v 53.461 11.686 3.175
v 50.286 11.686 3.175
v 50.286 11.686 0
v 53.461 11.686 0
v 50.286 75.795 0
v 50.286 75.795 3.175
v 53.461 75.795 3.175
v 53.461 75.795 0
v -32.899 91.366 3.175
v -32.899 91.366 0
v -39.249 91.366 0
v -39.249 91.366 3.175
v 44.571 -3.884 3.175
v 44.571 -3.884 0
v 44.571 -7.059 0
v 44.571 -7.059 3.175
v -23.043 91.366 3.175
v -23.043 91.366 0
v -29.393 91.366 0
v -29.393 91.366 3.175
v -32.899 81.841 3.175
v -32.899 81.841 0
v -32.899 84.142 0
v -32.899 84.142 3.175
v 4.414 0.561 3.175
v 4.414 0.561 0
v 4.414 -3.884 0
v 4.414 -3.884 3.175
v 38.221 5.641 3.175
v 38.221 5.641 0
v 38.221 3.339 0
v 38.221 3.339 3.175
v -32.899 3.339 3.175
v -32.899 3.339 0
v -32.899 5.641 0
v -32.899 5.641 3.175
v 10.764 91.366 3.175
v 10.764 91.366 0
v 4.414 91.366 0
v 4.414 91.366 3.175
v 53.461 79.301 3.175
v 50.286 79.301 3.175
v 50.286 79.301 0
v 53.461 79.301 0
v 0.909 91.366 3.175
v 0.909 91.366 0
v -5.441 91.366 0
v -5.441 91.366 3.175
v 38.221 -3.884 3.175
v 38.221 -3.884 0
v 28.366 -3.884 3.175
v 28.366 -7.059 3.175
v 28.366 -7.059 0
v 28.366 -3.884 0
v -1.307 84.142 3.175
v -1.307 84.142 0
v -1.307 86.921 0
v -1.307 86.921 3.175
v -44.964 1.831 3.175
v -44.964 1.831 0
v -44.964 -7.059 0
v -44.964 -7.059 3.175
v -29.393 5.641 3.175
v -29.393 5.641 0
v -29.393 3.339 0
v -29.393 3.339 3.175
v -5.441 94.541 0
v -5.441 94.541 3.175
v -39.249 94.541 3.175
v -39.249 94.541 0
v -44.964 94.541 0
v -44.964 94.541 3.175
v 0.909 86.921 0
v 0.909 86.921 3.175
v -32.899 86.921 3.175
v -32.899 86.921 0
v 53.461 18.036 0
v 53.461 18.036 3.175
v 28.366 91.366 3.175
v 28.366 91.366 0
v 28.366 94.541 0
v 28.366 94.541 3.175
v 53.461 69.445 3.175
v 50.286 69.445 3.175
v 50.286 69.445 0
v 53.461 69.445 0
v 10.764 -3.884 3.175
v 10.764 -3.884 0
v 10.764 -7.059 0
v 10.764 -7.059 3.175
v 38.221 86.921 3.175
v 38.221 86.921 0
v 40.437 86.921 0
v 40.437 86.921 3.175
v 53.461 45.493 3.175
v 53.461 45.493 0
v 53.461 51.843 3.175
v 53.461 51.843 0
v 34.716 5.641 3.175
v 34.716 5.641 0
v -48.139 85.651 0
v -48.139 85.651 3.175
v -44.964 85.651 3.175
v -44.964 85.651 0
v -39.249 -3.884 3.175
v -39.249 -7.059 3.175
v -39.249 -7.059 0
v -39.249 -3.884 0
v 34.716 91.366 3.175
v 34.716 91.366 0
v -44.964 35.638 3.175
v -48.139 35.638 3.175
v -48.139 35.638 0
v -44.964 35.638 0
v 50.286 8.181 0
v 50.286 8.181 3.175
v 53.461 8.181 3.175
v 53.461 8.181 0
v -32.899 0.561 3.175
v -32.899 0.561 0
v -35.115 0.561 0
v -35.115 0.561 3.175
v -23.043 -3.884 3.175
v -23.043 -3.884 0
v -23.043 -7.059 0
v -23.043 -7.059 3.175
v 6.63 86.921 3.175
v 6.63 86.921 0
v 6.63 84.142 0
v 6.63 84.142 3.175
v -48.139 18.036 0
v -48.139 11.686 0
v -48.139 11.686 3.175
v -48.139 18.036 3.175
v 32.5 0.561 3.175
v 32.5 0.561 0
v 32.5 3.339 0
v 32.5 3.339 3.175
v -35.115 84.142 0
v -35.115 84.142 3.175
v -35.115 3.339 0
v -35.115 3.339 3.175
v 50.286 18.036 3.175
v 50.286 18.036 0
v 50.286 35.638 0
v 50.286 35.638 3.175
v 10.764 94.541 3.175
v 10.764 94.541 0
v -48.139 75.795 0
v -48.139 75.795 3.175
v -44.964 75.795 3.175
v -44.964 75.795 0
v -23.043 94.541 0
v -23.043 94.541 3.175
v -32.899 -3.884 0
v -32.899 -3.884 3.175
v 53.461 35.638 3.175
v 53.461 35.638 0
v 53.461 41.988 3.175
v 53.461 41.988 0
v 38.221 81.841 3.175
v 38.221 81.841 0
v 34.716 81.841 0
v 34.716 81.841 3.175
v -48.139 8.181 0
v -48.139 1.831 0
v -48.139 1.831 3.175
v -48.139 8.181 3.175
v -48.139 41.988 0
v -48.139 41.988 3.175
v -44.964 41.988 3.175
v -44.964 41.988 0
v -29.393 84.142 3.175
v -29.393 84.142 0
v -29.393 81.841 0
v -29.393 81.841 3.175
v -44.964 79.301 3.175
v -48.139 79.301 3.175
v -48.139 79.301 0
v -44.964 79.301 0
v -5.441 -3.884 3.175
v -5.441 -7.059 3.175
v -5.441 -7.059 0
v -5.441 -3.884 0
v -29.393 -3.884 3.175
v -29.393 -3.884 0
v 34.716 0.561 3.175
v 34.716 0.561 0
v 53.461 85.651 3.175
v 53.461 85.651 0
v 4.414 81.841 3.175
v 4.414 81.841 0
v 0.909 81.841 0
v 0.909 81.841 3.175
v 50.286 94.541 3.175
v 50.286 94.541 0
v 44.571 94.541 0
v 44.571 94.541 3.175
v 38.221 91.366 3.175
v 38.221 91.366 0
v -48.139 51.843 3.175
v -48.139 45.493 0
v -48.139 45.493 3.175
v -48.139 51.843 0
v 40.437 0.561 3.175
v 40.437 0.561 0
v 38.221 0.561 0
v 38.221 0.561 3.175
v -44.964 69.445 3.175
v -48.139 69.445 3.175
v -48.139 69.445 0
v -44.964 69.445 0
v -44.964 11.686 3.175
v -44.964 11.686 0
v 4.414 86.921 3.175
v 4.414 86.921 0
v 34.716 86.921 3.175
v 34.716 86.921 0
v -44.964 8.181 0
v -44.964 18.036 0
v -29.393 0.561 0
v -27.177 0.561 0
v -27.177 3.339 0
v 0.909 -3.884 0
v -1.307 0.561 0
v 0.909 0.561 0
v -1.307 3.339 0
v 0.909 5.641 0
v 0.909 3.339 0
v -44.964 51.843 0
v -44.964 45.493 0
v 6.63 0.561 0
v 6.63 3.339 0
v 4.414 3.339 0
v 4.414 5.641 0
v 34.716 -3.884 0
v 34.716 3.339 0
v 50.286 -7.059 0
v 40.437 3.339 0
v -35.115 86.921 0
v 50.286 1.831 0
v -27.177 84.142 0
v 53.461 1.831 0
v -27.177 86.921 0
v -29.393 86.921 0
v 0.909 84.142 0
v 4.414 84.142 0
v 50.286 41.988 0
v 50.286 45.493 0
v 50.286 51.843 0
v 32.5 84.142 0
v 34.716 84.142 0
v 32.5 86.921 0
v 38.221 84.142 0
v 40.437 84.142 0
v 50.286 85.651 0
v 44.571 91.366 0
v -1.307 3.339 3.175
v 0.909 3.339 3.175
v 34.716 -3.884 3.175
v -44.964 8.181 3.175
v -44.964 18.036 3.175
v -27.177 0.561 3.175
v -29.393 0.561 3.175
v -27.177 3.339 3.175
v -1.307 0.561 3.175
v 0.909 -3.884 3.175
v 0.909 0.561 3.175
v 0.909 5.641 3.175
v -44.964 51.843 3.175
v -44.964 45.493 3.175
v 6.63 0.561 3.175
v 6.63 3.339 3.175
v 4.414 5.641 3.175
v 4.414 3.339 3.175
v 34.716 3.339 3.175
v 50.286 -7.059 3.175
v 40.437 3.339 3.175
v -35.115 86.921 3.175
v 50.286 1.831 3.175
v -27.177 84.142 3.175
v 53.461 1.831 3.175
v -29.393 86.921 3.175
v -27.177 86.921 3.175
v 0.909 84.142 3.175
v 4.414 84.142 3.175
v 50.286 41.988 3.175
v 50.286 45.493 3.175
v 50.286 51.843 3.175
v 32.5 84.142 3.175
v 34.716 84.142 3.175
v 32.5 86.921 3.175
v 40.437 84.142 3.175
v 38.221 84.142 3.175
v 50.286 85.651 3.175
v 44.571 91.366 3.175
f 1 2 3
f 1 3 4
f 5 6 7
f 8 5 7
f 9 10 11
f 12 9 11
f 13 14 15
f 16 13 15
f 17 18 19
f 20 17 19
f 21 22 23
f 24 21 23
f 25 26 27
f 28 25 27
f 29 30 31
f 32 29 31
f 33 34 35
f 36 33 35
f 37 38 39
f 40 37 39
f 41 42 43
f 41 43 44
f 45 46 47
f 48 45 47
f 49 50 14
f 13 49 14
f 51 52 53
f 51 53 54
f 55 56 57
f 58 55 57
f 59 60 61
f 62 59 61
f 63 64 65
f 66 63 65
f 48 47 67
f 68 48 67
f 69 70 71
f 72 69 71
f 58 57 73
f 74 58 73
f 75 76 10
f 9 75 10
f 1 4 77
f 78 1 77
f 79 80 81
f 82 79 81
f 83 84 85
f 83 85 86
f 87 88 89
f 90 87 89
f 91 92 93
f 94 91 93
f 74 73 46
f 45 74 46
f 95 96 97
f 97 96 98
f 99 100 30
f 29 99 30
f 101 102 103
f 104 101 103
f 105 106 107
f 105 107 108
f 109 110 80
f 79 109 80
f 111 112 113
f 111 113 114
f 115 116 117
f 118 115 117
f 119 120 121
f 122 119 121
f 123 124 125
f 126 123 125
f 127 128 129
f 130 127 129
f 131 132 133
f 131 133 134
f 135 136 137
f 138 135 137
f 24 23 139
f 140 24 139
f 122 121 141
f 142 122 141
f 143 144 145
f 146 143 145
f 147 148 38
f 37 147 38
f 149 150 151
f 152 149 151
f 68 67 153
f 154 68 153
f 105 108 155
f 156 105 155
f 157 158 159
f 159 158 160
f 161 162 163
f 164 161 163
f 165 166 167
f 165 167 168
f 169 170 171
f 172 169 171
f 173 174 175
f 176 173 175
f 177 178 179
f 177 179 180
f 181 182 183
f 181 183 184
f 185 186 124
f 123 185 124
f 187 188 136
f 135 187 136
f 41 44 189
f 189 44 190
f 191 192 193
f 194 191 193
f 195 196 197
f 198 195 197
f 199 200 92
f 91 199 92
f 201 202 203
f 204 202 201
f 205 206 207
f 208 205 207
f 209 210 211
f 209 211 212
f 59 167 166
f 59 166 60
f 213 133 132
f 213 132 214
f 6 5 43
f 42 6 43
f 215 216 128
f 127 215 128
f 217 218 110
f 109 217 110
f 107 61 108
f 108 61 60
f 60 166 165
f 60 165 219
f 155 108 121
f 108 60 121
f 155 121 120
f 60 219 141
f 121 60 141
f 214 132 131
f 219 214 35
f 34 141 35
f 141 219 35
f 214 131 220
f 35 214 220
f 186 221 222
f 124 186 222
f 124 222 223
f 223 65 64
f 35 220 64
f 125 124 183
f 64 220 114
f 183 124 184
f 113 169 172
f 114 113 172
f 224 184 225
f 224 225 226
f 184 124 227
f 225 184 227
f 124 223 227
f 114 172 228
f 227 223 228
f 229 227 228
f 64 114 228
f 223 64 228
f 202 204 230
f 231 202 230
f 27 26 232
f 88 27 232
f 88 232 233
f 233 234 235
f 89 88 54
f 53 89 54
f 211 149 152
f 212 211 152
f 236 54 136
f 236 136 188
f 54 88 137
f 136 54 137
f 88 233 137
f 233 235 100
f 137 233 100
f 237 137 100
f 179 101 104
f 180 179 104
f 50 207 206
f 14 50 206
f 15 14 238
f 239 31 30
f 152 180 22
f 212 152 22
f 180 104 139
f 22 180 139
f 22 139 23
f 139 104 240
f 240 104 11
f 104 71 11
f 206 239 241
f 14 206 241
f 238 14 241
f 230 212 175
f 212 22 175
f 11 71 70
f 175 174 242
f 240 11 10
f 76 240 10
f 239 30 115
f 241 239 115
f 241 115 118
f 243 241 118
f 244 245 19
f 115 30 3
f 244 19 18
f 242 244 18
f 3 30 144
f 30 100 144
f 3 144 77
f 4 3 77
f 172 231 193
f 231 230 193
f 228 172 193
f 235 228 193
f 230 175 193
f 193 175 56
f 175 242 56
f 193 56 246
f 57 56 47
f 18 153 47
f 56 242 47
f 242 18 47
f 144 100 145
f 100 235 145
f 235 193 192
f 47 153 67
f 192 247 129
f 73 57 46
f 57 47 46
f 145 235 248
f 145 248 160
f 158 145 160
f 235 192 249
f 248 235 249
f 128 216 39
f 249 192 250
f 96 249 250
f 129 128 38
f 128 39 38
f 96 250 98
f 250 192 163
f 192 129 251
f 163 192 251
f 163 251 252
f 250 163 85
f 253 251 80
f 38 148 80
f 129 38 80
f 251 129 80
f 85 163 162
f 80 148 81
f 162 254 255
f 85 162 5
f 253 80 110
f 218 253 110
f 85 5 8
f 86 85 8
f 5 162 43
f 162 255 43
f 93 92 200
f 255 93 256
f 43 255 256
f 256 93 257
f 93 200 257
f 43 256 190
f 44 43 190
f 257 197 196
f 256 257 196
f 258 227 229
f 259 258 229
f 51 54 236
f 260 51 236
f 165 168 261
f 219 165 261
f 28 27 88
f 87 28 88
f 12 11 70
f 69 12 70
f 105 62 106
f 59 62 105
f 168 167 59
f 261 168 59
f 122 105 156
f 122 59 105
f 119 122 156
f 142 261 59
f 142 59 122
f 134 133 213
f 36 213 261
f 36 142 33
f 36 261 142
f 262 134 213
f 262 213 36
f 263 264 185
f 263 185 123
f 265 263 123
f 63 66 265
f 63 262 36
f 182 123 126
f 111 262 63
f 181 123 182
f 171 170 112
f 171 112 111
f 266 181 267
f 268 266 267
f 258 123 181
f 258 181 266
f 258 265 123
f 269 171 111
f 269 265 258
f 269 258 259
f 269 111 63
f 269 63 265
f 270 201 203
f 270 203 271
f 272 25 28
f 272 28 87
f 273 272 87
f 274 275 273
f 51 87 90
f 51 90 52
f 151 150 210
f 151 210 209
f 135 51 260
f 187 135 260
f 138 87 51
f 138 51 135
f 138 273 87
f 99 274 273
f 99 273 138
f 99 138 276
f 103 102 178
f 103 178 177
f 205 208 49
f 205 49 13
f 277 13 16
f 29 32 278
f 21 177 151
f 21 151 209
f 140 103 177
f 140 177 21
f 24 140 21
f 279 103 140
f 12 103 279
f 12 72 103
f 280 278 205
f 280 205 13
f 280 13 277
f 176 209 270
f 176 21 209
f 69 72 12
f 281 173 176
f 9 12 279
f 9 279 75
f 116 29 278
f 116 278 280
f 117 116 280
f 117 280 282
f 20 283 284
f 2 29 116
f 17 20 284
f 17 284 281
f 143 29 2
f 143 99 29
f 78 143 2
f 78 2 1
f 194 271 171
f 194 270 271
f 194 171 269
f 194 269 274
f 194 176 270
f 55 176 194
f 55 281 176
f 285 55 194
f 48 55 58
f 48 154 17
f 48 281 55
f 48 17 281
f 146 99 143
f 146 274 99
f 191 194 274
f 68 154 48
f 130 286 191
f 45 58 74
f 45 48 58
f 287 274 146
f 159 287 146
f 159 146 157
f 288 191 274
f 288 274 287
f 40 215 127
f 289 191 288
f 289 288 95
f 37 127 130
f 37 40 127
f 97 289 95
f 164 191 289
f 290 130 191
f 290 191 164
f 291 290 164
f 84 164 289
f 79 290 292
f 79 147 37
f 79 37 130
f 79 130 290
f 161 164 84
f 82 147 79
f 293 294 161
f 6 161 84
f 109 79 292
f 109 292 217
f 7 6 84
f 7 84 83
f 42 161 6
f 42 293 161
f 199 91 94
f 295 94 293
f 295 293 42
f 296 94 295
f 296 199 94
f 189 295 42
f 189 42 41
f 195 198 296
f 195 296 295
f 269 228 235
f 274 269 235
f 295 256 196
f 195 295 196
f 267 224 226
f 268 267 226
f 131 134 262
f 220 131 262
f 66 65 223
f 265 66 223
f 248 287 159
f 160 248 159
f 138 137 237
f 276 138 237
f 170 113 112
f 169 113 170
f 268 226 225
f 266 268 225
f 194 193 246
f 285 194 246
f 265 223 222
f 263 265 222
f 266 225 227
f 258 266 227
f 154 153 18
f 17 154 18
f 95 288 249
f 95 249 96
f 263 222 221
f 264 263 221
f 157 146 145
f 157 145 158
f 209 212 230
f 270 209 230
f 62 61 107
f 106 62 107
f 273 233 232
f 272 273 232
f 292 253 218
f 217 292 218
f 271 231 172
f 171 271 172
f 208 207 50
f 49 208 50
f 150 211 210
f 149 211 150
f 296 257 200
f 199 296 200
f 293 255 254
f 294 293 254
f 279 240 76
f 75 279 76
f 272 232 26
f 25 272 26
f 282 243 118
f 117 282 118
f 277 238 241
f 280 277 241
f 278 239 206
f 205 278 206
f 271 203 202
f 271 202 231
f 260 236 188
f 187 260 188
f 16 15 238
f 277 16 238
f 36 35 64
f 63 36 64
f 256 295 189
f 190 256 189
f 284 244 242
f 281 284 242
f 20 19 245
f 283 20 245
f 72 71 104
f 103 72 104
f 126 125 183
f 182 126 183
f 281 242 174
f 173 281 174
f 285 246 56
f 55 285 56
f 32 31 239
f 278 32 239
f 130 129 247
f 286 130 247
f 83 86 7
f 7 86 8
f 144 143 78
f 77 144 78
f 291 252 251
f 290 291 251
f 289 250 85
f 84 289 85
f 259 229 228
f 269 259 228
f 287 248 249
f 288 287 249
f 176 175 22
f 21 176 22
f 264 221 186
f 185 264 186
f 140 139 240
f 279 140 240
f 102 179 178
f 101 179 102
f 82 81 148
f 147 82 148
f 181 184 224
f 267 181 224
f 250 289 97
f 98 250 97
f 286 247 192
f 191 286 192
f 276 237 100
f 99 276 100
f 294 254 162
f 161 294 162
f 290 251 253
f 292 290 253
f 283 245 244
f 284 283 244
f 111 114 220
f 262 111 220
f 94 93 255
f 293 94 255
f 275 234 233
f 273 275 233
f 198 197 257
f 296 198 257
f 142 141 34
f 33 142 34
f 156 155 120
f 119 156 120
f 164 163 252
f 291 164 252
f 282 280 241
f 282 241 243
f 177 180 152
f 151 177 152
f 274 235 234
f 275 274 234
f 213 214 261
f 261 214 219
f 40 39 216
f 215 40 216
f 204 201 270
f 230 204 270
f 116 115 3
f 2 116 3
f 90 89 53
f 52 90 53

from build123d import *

# Parameters (mm, degrees)
F0_W     = 3.175
F0_H     = 6.35
F1_DEPTH = 3.175


with BuildPart() as f1:
    # F0 (on Top) → F1 (new body)
    with BuildSketch(Plane.XY):
        Polygon((-39.248684, 94.540516), (-44.963684, 94.540516), (-44.963684, 85.650516), (-44.963684, 79.300516), (-44.963684, 75.795316), (-44.963684, 69.445316), (-44.963684, 51.843116), (-44.963684, 45.493116), (-44.963684, 43.740516), (50.286316, 43.740516), (50.286316, 45.493116), (50.286316, 51.843116), (50.286316, 69.445316), (50.286316, 75.795316), (50.286316, 79.300516), (50.286316, 85.650516), (50.286316, 94.540516), (44.571316, 94.540516), (44.571316, 91.365516), (38.221316, 91.365516), (38.221316, 86.920516), (40.437466, 86.920516), (40.437466, 84.142391), (38.221316, 84.142391), (38.221316, 81.840516), (34.716116, 81.840516), (34.716116, 84.142391), (32.499966, 84.142391), (32.499966, 86.920516), (34.716116, 86.920516), (34.716116, 91.365516), (28.366116, 91.365516), (28.366116, 94.540516), (10.763916, 94.540516), (10.763916, 91.365516), (4.413916, 91.365516), (4.413916, 86.920516), (6.630066, 86.920516), (6.630066, 84.142391), (4.413916, 84.142391), (4.413916, 81.840516), (0.908716, 81.840516), (0.908716, 84.142391), (-1.307434, 84.142391), (-1.307434, 86.920516), (0.908716, 86.920516), (0.908716, 91.365516), (-5.441284, 91.365516), (-5.441284, 94.540516), (-23.043484, 94.540516), (-23.043484, 91.365516), (-29.393484, 91.365516), (-29.393484, 86.920516), (-27.177334, 86.920516), (-27.177334, 84.142391), (-29.393484, 84.142391), (-29.393484, 81.840516), (-32.898684, 81.840516), (-32.898684, 84.142391), (-35.114834, 84.142391), (-35.114834, 86.920516), (-32.898684, 86.920516), (-32.898684, 91.365516), (-39.248684, 91.365516), align=None)
        Polygon((50.286316, 43.740516), (-44.963684, 43.740516), (-44.963684, 41.987916), (-44.963684, 35.637916), (-44.963684, 18.035716), (-44.963684, 11.685716), (-44.963684, 8.180516), (-44.963684, 1.830516), (-44.963684, -7.059484), (-39.248684, -7.059484), (-39.248684, -3.884484), (-32.898684, -3.884484), (-32.898684, 0.560516), (-35.114834, 0.560516), (-35.114834, 3.338641), (-32.898684, 3.338641), (-32.898684, 5.640516), (-29.393484, 5.640516), (-29.393484, 3.338641), (-27.177334, 3.338641), (-27.177334, 0.560516), (-29.393484, 0.560516), (-29.393484, -3.884484), (-23.043484, -3.884484), (-23.043484, -7.059484), (-5.441284, -7.059484), (-5.441284, -3.884484), (0.908716, -3.884484), (0.908716, 0.560516), (-1.307434, 0.560516), (-1.307434, 3.338641), (0.908716, 3.338641), (0.908716, 5.640516), (4.413916, 5.640516), (4.413916, 3.338641), (6.630066, 3.338641), (6.630066, 0.560516), (4.413916, 0.560516), (4.413916, -3.884484), (10.763916, -3.884484), (10.763916, -7.059484), (28.366116, -7.059484), (28.366116, -3.884484), (34.716116, -3.884484), (34.716116, 0.560516), (32.499966, 0.560516), (32.499966, 3.338641), (34.716116, 3.338641), (34.716116, 5.640516), (38.221316, 5.640516), (38.221316, 3.338641), (40.437466, 3.338641), (40.437466, 0.560516), (38.221316, 0.560516), (38.221316, -3.884484), (44.571316, -3.884484), (44.571316, -7.059484), (50.286316, -7.059484), (50.286316, 1.830516), (50.286316, 8.180516), (50.286316, 11.685716), (50.286316, 18.035716), (50.286316, 35.637916), (50.286316, 41.987916), align=None)
        with Locations((-46.551184, 48.668116)):
            Rectangle(F0_W, F0_H)
        with Locations((-46.551184, 72.620316)):
            Rectangle(F0_W, F0_H)
        with Locations((-46.551184, 82.475516)):
            Rectangle(F0_W, F0_H)
        with Locations((-46.551184, 38.812916)):
            Rectangle(F0_W, F0_H)
        with Locations((-46.551184, 14.860716)):
            Rectangle(F0_W, F0_H)
        with Locations((-46.551184, 5.005516)):
            Rectangle(F0_W, F0_H)
        with Locations((51.873816, 5.005516)):
            Rectangle(F0_W, F0_H)
        with Locations((51.873816, 14.860716)):
            Rectangle(F0_W, F0_H)
        with Locations((51.873816, 38.812916)):
            Rectangle(F0_W, F0_H)
        with Locations((51.873816, 48.668116)):
            Rectangle(F0_W, F0_H)
        with Locations((51.873816, 72.620316)):
            Rectangle(F0_W, F0_H)
        with Locations((51.873816, 82.475516)):
            Rectangle(F0_W, F0_H)
    extrude(amount=F1_DEPTH)


solid = f1.part
